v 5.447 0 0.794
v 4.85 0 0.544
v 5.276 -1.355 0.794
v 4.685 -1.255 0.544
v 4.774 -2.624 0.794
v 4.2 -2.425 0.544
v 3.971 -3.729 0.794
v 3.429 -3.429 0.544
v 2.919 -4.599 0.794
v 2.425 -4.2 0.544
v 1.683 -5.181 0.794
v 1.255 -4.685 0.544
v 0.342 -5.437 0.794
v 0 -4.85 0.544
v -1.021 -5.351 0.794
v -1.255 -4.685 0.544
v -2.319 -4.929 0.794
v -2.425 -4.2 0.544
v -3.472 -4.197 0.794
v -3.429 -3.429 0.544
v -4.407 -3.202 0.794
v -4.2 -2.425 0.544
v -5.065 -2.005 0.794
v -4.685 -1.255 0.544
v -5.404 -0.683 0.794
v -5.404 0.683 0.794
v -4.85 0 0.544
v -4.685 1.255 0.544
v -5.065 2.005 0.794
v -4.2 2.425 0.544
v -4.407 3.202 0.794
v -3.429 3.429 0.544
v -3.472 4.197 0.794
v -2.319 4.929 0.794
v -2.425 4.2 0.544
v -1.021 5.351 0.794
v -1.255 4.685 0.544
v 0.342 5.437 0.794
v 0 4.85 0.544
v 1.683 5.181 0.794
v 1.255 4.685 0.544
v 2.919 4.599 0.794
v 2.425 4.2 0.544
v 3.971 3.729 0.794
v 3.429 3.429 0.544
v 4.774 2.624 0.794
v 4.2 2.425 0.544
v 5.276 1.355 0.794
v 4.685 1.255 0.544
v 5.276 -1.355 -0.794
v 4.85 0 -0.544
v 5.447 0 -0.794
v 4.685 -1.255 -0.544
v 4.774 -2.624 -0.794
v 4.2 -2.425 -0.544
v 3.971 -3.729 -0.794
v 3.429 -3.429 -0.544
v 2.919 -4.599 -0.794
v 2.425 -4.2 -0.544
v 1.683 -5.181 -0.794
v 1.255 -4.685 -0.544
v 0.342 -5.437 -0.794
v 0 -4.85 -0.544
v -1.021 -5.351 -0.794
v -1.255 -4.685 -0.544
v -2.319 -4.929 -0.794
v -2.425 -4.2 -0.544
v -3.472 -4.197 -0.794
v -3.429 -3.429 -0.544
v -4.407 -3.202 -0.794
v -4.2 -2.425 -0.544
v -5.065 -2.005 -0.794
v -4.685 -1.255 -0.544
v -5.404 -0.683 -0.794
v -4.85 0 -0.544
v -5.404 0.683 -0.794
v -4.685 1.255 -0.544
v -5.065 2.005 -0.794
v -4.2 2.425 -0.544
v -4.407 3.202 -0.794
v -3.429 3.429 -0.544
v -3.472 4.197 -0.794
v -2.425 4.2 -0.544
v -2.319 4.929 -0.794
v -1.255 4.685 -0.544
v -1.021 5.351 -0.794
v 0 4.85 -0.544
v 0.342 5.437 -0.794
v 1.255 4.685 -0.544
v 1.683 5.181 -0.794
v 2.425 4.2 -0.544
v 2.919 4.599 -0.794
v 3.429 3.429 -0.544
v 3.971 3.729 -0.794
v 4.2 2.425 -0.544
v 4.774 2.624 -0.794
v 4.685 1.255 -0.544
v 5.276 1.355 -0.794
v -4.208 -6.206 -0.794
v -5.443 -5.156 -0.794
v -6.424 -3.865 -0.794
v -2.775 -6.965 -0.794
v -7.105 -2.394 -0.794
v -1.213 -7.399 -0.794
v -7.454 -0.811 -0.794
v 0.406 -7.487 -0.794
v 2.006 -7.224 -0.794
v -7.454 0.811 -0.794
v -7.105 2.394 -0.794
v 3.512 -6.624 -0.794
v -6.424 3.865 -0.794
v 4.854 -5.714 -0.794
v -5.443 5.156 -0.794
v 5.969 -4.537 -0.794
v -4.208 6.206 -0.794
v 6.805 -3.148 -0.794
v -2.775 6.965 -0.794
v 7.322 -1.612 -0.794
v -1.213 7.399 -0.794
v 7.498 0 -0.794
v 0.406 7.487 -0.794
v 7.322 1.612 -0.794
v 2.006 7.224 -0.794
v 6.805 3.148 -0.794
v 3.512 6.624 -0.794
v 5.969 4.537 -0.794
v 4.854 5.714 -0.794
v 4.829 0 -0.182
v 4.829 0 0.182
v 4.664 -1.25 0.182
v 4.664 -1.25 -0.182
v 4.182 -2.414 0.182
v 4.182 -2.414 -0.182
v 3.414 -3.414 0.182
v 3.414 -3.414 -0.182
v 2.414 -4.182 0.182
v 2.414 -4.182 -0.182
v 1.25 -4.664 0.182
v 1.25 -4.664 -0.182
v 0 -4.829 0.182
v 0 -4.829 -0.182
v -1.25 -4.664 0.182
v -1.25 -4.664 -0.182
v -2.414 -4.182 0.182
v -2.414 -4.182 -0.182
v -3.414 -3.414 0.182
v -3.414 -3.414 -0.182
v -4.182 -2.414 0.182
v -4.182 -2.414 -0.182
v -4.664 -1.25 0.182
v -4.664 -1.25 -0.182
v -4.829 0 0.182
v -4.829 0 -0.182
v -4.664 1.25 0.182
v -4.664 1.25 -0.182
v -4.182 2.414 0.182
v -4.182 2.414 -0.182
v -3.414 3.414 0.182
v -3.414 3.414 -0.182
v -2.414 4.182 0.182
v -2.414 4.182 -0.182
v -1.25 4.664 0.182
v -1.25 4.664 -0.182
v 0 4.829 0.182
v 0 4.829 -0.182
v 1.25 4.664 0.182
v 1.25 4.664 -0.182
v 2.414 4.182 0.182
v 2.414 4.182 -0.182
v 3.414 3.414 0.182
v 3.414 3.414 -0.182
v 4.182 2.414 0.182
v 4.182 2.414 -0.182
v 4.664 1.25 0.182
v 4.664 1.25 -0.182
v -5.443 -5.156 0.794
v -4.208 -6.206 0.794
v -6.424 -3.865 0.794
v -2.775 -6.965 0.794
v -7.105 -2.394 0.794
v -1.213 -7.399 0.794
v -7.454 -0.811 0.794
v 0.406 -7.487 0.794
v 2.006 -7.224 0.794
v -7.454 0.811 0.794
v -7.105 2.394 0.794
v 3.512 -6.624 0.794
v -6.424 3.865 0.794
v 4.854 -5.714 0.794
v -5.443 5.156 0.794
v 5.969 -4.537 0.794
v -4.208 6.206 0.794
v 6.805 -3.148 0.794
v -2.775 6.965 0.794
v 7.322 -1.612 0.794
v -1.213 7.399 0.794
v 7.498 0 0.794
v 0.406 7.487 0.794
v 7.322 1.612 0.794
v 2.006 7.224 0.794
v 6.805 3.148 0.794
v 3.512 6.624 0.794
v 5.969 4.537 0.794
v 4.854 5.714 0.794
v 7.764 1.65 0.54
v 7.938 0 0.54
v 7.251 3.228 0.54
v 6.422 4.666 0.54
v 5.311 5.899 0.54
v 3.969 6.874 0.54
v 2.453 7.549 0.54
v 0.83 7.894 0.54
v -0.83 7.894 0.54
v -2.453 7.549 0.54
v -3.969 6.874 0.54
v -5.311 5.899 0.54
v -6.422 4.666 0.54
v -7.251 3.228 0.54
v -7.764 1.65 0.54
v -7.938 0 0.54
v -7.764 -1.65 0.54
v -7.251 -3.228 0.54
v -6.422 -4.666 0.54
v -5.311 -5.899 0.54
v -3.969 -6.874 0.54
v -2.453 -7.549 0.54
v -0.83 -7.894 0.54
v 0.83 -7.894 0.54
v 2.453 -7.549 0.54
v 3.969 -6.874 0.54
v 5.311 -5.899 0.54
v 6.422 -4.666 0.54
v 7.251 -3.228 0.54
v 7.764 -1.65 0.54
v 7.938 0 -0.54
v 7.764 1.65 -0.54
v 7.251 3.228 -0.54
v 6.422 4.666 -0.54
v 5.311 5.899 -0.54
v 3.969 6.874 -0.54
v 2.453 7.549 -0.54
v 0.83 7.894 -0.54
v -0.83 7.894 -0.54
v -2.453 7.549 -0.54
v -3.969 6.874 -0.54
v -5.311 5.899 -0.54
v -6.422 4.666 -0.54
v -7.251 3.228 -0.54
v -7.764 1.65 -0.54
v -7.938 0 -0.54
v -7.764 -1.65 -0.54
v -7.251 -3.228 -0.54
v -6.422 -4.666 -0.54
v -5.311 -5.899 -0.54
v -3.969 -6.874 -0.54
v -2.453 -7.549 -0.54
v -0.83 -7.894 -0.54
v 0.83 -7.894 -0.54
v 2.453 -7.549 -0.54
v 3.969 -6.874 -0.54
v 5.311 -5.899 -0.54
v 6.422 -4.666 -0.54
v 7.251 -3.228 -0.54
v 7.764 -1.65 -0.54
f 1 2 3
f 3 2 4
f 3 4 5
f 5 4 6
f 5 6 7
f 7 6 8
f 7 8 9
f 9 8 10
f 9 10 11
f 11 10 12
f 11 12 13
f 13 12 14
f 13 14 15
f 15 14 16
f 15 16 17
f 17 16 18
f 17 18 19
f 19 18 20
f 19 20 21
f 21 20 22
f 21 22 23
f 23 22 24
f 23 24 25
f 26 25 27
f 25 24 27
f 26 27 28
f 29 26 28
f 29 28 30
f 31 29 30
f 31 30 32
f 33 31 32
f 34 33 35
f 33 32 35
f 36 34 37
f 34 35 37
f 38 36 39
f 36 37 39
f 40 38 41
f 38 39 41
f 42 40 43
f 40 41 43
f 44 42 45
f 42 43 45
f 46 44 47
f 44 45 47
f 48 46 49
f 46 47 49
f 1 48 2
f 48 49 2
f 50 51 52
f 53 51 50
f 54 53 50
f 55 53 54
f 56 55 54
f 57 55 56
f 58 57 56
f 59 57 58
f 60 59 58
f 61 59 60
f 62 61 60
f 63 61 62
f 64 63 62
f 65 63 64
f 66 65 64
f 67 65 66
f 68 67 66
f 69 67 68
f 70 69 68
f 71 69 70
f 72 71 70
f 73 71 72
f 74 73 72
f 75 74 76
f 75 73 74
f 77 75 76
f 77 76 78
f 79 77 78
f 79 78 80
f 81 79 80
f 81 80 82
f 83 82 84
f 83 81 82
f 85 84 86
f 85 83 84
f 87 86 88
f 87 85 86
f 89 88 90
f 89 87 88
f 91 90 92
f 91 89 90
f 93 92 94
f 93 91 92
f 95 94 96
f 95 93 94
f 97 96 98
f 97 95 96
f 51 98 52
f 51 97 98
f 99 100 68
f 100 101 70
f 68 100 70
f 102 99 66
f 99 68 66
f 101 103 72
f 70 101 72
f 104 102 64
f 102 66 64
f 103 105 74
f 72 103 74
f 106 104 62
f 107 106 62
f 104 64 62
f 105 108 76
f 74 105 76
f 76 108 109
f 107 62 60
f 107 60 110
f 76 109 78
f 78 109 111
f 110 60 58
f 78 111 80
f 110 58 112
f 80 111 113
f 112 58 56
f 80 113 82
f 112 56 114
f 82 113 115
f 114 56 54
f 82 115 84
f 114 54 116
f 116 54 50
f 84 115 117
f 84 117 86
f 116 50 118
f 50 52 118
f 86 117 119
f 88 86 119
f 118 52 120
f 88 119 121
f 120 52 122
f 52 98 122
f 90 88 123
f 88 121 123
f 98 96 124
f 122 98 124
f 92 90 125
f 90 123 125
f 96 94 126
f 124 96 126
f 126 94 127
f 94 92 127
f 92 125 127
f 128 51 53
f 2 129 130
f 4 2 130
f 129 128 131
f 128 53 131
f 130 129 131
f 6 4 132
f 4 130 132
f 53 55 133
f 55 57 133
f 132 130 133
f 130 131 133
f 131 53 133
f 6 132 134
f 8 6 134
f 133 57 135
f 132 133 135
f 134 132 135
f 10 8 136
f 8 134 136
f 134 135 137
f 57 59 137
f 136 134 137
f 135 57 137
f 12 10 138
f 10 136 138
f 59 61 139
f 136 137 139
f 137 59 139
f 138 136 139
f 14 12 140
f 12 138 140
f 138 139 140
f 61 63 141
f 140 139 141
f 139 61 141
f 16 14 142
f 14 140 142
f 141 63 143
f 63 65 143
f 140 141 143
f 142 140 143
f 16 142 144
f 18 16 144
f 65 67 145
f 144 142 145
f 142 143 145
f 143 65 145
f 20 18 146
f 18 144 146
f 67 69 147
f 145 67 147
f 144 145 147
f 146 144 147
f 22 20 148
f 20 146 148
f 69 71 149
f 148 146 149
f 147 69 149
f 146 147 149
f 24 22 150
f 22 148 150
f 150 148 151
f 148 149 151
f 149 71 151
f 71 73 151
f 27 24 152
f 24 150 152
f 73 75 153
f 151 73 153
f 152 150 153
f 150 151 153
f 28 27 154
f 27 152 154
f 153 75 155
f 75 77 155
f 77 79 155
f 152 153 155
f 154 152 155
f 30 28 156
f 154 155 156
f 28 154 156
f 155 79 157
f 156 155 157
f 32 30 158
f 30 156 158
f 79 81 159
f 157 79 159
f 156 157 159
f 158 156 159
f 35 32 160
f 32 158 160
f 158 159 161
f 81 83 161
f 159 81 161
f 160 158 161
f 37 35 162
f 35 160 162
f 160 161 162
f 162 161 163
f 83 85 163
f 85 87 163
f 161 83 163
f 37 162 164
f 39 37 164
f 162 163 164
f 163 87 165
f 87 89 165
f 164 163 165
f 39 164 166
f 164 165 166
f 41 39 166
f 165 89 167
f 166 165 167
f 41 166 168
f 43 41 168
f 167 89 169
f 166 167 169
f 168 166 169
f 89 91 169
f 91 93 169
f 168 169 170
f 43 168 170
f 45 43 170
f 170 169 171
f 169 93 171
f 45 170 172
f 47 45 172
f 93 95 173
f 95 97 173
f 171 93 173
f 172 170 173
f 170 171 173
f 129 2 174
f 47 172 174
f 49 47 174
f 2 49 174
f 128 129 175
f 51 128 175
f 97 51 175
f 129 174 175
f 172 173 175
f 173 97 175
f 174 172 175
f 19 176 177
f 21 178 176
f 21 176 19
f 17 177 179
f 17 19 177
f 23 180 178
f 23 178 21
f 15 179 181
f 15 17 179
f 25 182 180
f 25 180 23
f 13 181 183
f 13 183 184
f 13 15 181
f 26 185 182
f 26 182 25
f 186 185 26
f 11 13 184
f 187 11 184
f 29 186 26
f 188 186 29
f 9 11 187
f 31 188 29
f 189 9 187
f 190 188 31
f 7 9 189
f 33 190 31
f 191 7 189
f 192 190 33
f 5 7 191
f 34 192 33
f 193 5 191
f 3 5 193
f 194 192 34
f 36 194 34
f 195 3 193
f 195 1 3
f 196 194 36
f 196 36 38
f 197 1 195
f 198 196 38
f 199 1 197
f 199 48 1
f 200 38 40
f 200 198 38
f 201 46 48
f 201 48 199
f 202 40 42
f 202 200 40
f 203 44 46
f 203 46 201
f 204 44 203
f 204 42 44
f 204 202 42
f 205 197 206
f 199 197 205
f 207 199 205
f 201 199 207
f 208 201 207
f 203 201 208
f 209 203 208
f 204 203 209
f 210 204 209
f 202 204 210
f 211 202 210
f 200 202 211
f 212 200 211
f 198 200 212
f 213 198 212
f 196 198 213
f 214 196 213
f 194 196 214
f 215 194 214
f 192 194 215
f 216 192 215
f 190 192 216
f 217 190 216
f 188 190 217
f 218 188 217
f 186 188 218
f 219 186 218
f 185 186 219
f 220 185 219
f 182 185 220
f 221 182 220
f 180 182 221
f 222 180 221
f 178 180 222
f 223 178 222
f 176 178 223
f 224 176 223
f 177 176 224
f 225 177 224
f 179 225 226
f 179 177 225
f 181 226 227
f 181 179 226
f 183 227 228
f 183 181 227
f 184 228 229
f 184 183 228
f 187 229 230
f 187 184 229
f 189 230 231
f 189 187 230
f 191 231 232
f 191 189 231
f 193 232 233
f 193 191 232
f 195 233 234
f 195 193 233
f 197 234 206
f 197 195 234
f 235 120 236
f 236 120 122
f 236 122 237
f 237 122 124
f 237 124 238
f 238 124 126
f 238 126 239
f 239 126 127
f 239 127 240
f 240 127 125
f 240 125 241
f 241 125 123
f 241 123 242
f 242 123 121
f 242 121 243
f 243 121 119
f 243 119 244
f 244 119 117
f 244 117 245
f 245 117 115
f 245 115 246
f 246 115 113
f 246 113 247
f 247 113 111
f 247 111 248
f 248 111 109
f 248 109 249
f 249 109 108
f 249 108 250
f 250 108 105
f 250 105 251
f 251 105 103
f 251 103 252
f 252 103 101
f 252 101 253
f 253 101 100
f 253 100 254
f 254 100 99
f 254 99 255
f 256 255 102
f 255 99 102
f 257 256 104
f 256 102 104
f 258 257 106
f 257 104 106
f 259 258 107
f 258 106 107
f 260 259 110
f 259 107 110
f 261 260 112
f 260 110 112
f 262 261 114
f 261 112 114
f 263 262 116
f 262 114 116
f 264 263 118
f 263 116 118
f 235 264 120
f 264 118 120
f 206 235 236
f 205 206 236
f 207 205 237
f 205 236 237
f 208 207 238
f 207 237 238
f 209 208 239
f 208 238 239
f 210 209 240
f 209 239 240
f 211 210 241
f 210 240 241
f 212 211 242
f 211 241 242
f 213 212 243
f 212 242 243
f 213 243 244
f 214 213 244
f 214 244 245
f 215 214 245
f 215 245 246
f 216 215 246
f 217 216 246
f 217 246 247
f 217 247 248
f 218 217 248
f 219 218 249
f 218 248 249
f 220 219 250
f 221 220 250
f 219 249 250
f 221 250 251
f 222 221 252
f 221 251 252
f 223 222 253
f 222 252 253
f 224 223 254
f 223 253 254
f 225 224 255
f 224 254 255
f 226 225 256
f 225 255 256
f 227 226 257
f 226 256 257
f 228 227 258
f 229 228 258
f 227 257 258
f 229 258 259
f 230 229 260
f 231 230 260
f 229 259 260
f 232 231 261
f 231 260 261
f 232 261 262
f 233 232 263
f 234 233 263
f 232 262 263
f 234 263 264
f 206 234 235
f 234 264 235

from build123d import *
from OCP.BRepFilletAPI import BRepFilletAPI_MakeChamfer

# Parameters (mm, degrees)
BOSS_EXTRUDE1_DEPTH      = 0.79375
BOSS_EXTRUDE1_DEPTH_BACK = 0.79375
SKETCH3_R                = 7.9375
SKETCH3_R_2              = 4.826
CHAMFER1_SIZE            = 0.254
CHAMFER1_SIZE2           = 0.439940905
CHAMFER2_SIZE            = 0.570578725


with BuildPart() as part:
    # Sketch3 → Boss-Extrude1 (new, two sides: drawn at the far end of the back side and taken through both)
    with BuildSketch(Plane.XY.offset(-BOSS_EXTRUDE1_DEPTH_BACK)):
        Circle(SKETCH3_R)
        Circle(SKETCH3_R_2, mode=Mode.SUBTRACT)
    extrude(amount=BOSS_EXTRUDE1_DEPTH + BOSS_EXTRUDE1_DEPTH_BACK)

    # Chamfer1: one chamfer whose edges measure the first distance from different faces: ONE call of the kernel's chamfer builder (chamfer() names one face for all edges)
    chamfer1_edges_1 = [part.edges().sort_by_distance(p)[0] for p in [
        (-7.9375, 0, 0.79375),
    ]]
    chamfer1_side_1 = [part.faces().sort_by_distance(p)[0] for p in [
        (-7.9375, 0, 0.396875),
    ]]
    chamfer1_edges_2 = [part.edges().sort_by_distance(p)[0] for p in [
        (-7.9375, 0, -0.79375),
    ]]
    chamfer1_side_2 = [part.faces().sort_by_distance(p)[0] for p in [
        (-7.9375, 0, -0.396875),
    ]]
    chamfer1 = BRepFilletAPI_MakeChamfer(part.part.solid().wrapped)
    for e in chamfer1_edges_1:
        chamfer1.Add(CHAMFER1_SIZE, CHAMFER1_SIZE2, e.wrapped, chamfer1_side_1[0].wrapped)  # the first distance lies on this face
    for e in chamfer1_edges_2:
        chamfer1.Add(CHAMFER1_SIZE, CHAMFER1_SIZE2, e.wrapped, chamfer1_side_2[0].wrapped)  # the first distance lies on this face
    add(Compound.cast(chamfer1.Shape()), mode=Mode.REPLACE)

    # Sketch4 → Cut-Revolve1 (revolve, cut)
    with BuildSketch(Plane(origin=(0, 0, 0), x_dir=(0, 0, -1), z_dir=(1, 0, 0)), mode=Mode.PRIVATE) as cut_revolve1_sk:
        with BuildLine():
            Line((-0.79375, 4.7752), (-0.79375, 4.8768))
            ThreePointArc((-0.79375, 4.8768), (0, 4.826), (0.79375, 4.8768))
            Line((0.79375, 4.8768), (0.79375, 4.7752))
            Line((0.79375, 4.7752), (-0.79375, 4.7752))
        make_face()
    revolve(cut_revolve1_sk.sketch.rotate(Axis((0, 0, 0.79375), (0, 0, -1)), 90), axis=Axis((0, 0, 0.79375), (0, 0, -1)), mode=Mode.SUBTRACT)

    # Chamfer2
    # the kernel refuses this chamfer: 0.570578725, 0.254 mm, written as the material it takes off along each edge
    with BuildSketch(Plane(origin=(0, 0, -0.79375), x_dir=(1, 0, 0), z_dir=(0, 1, 0))) as chamfer2_piece_1:
        with BuildLine():
            Line((4.8768 + CHAMFER2_SIZE, 0), (4.849816205, -0.249673341))
            ThreePointArc((4.849816205, -0.249673341), (4.86146095, -0.130166676), (4.8768, 0))
            Line((4.8768, 0), (4.8768 + CHAMFER2_SIZE, 0))
        make_face()
    revolve(axis=Axis((0, 0, -0.79375), (0, 0, -1)), mode=Mode.SUBTRACT)
    with BuildSketch(Plane(origin=(0, 0, 0.79375), x_dir=(1, 0, 0), z_dir=(0, 1, 0))) as chamfer2_piece_2:
        with BuildLine():
            Line((4.8768 + CHAMFER2_SIZE, 0), (4.849816205, 0.249673341))
            ThreePointArc((4.849816205, 0.249673341), (4.86146095, 0.130166676), (4.8768, 0))
            Line((4.8768, 0), (4.8768 + CHAMFER2_SIZE, 0))
        make_face()
    revolve(axis=Axis((0, 0, 0.79375), (0, 0, -1)), mode=Mode.SUBTRACT)


solid = part.part
